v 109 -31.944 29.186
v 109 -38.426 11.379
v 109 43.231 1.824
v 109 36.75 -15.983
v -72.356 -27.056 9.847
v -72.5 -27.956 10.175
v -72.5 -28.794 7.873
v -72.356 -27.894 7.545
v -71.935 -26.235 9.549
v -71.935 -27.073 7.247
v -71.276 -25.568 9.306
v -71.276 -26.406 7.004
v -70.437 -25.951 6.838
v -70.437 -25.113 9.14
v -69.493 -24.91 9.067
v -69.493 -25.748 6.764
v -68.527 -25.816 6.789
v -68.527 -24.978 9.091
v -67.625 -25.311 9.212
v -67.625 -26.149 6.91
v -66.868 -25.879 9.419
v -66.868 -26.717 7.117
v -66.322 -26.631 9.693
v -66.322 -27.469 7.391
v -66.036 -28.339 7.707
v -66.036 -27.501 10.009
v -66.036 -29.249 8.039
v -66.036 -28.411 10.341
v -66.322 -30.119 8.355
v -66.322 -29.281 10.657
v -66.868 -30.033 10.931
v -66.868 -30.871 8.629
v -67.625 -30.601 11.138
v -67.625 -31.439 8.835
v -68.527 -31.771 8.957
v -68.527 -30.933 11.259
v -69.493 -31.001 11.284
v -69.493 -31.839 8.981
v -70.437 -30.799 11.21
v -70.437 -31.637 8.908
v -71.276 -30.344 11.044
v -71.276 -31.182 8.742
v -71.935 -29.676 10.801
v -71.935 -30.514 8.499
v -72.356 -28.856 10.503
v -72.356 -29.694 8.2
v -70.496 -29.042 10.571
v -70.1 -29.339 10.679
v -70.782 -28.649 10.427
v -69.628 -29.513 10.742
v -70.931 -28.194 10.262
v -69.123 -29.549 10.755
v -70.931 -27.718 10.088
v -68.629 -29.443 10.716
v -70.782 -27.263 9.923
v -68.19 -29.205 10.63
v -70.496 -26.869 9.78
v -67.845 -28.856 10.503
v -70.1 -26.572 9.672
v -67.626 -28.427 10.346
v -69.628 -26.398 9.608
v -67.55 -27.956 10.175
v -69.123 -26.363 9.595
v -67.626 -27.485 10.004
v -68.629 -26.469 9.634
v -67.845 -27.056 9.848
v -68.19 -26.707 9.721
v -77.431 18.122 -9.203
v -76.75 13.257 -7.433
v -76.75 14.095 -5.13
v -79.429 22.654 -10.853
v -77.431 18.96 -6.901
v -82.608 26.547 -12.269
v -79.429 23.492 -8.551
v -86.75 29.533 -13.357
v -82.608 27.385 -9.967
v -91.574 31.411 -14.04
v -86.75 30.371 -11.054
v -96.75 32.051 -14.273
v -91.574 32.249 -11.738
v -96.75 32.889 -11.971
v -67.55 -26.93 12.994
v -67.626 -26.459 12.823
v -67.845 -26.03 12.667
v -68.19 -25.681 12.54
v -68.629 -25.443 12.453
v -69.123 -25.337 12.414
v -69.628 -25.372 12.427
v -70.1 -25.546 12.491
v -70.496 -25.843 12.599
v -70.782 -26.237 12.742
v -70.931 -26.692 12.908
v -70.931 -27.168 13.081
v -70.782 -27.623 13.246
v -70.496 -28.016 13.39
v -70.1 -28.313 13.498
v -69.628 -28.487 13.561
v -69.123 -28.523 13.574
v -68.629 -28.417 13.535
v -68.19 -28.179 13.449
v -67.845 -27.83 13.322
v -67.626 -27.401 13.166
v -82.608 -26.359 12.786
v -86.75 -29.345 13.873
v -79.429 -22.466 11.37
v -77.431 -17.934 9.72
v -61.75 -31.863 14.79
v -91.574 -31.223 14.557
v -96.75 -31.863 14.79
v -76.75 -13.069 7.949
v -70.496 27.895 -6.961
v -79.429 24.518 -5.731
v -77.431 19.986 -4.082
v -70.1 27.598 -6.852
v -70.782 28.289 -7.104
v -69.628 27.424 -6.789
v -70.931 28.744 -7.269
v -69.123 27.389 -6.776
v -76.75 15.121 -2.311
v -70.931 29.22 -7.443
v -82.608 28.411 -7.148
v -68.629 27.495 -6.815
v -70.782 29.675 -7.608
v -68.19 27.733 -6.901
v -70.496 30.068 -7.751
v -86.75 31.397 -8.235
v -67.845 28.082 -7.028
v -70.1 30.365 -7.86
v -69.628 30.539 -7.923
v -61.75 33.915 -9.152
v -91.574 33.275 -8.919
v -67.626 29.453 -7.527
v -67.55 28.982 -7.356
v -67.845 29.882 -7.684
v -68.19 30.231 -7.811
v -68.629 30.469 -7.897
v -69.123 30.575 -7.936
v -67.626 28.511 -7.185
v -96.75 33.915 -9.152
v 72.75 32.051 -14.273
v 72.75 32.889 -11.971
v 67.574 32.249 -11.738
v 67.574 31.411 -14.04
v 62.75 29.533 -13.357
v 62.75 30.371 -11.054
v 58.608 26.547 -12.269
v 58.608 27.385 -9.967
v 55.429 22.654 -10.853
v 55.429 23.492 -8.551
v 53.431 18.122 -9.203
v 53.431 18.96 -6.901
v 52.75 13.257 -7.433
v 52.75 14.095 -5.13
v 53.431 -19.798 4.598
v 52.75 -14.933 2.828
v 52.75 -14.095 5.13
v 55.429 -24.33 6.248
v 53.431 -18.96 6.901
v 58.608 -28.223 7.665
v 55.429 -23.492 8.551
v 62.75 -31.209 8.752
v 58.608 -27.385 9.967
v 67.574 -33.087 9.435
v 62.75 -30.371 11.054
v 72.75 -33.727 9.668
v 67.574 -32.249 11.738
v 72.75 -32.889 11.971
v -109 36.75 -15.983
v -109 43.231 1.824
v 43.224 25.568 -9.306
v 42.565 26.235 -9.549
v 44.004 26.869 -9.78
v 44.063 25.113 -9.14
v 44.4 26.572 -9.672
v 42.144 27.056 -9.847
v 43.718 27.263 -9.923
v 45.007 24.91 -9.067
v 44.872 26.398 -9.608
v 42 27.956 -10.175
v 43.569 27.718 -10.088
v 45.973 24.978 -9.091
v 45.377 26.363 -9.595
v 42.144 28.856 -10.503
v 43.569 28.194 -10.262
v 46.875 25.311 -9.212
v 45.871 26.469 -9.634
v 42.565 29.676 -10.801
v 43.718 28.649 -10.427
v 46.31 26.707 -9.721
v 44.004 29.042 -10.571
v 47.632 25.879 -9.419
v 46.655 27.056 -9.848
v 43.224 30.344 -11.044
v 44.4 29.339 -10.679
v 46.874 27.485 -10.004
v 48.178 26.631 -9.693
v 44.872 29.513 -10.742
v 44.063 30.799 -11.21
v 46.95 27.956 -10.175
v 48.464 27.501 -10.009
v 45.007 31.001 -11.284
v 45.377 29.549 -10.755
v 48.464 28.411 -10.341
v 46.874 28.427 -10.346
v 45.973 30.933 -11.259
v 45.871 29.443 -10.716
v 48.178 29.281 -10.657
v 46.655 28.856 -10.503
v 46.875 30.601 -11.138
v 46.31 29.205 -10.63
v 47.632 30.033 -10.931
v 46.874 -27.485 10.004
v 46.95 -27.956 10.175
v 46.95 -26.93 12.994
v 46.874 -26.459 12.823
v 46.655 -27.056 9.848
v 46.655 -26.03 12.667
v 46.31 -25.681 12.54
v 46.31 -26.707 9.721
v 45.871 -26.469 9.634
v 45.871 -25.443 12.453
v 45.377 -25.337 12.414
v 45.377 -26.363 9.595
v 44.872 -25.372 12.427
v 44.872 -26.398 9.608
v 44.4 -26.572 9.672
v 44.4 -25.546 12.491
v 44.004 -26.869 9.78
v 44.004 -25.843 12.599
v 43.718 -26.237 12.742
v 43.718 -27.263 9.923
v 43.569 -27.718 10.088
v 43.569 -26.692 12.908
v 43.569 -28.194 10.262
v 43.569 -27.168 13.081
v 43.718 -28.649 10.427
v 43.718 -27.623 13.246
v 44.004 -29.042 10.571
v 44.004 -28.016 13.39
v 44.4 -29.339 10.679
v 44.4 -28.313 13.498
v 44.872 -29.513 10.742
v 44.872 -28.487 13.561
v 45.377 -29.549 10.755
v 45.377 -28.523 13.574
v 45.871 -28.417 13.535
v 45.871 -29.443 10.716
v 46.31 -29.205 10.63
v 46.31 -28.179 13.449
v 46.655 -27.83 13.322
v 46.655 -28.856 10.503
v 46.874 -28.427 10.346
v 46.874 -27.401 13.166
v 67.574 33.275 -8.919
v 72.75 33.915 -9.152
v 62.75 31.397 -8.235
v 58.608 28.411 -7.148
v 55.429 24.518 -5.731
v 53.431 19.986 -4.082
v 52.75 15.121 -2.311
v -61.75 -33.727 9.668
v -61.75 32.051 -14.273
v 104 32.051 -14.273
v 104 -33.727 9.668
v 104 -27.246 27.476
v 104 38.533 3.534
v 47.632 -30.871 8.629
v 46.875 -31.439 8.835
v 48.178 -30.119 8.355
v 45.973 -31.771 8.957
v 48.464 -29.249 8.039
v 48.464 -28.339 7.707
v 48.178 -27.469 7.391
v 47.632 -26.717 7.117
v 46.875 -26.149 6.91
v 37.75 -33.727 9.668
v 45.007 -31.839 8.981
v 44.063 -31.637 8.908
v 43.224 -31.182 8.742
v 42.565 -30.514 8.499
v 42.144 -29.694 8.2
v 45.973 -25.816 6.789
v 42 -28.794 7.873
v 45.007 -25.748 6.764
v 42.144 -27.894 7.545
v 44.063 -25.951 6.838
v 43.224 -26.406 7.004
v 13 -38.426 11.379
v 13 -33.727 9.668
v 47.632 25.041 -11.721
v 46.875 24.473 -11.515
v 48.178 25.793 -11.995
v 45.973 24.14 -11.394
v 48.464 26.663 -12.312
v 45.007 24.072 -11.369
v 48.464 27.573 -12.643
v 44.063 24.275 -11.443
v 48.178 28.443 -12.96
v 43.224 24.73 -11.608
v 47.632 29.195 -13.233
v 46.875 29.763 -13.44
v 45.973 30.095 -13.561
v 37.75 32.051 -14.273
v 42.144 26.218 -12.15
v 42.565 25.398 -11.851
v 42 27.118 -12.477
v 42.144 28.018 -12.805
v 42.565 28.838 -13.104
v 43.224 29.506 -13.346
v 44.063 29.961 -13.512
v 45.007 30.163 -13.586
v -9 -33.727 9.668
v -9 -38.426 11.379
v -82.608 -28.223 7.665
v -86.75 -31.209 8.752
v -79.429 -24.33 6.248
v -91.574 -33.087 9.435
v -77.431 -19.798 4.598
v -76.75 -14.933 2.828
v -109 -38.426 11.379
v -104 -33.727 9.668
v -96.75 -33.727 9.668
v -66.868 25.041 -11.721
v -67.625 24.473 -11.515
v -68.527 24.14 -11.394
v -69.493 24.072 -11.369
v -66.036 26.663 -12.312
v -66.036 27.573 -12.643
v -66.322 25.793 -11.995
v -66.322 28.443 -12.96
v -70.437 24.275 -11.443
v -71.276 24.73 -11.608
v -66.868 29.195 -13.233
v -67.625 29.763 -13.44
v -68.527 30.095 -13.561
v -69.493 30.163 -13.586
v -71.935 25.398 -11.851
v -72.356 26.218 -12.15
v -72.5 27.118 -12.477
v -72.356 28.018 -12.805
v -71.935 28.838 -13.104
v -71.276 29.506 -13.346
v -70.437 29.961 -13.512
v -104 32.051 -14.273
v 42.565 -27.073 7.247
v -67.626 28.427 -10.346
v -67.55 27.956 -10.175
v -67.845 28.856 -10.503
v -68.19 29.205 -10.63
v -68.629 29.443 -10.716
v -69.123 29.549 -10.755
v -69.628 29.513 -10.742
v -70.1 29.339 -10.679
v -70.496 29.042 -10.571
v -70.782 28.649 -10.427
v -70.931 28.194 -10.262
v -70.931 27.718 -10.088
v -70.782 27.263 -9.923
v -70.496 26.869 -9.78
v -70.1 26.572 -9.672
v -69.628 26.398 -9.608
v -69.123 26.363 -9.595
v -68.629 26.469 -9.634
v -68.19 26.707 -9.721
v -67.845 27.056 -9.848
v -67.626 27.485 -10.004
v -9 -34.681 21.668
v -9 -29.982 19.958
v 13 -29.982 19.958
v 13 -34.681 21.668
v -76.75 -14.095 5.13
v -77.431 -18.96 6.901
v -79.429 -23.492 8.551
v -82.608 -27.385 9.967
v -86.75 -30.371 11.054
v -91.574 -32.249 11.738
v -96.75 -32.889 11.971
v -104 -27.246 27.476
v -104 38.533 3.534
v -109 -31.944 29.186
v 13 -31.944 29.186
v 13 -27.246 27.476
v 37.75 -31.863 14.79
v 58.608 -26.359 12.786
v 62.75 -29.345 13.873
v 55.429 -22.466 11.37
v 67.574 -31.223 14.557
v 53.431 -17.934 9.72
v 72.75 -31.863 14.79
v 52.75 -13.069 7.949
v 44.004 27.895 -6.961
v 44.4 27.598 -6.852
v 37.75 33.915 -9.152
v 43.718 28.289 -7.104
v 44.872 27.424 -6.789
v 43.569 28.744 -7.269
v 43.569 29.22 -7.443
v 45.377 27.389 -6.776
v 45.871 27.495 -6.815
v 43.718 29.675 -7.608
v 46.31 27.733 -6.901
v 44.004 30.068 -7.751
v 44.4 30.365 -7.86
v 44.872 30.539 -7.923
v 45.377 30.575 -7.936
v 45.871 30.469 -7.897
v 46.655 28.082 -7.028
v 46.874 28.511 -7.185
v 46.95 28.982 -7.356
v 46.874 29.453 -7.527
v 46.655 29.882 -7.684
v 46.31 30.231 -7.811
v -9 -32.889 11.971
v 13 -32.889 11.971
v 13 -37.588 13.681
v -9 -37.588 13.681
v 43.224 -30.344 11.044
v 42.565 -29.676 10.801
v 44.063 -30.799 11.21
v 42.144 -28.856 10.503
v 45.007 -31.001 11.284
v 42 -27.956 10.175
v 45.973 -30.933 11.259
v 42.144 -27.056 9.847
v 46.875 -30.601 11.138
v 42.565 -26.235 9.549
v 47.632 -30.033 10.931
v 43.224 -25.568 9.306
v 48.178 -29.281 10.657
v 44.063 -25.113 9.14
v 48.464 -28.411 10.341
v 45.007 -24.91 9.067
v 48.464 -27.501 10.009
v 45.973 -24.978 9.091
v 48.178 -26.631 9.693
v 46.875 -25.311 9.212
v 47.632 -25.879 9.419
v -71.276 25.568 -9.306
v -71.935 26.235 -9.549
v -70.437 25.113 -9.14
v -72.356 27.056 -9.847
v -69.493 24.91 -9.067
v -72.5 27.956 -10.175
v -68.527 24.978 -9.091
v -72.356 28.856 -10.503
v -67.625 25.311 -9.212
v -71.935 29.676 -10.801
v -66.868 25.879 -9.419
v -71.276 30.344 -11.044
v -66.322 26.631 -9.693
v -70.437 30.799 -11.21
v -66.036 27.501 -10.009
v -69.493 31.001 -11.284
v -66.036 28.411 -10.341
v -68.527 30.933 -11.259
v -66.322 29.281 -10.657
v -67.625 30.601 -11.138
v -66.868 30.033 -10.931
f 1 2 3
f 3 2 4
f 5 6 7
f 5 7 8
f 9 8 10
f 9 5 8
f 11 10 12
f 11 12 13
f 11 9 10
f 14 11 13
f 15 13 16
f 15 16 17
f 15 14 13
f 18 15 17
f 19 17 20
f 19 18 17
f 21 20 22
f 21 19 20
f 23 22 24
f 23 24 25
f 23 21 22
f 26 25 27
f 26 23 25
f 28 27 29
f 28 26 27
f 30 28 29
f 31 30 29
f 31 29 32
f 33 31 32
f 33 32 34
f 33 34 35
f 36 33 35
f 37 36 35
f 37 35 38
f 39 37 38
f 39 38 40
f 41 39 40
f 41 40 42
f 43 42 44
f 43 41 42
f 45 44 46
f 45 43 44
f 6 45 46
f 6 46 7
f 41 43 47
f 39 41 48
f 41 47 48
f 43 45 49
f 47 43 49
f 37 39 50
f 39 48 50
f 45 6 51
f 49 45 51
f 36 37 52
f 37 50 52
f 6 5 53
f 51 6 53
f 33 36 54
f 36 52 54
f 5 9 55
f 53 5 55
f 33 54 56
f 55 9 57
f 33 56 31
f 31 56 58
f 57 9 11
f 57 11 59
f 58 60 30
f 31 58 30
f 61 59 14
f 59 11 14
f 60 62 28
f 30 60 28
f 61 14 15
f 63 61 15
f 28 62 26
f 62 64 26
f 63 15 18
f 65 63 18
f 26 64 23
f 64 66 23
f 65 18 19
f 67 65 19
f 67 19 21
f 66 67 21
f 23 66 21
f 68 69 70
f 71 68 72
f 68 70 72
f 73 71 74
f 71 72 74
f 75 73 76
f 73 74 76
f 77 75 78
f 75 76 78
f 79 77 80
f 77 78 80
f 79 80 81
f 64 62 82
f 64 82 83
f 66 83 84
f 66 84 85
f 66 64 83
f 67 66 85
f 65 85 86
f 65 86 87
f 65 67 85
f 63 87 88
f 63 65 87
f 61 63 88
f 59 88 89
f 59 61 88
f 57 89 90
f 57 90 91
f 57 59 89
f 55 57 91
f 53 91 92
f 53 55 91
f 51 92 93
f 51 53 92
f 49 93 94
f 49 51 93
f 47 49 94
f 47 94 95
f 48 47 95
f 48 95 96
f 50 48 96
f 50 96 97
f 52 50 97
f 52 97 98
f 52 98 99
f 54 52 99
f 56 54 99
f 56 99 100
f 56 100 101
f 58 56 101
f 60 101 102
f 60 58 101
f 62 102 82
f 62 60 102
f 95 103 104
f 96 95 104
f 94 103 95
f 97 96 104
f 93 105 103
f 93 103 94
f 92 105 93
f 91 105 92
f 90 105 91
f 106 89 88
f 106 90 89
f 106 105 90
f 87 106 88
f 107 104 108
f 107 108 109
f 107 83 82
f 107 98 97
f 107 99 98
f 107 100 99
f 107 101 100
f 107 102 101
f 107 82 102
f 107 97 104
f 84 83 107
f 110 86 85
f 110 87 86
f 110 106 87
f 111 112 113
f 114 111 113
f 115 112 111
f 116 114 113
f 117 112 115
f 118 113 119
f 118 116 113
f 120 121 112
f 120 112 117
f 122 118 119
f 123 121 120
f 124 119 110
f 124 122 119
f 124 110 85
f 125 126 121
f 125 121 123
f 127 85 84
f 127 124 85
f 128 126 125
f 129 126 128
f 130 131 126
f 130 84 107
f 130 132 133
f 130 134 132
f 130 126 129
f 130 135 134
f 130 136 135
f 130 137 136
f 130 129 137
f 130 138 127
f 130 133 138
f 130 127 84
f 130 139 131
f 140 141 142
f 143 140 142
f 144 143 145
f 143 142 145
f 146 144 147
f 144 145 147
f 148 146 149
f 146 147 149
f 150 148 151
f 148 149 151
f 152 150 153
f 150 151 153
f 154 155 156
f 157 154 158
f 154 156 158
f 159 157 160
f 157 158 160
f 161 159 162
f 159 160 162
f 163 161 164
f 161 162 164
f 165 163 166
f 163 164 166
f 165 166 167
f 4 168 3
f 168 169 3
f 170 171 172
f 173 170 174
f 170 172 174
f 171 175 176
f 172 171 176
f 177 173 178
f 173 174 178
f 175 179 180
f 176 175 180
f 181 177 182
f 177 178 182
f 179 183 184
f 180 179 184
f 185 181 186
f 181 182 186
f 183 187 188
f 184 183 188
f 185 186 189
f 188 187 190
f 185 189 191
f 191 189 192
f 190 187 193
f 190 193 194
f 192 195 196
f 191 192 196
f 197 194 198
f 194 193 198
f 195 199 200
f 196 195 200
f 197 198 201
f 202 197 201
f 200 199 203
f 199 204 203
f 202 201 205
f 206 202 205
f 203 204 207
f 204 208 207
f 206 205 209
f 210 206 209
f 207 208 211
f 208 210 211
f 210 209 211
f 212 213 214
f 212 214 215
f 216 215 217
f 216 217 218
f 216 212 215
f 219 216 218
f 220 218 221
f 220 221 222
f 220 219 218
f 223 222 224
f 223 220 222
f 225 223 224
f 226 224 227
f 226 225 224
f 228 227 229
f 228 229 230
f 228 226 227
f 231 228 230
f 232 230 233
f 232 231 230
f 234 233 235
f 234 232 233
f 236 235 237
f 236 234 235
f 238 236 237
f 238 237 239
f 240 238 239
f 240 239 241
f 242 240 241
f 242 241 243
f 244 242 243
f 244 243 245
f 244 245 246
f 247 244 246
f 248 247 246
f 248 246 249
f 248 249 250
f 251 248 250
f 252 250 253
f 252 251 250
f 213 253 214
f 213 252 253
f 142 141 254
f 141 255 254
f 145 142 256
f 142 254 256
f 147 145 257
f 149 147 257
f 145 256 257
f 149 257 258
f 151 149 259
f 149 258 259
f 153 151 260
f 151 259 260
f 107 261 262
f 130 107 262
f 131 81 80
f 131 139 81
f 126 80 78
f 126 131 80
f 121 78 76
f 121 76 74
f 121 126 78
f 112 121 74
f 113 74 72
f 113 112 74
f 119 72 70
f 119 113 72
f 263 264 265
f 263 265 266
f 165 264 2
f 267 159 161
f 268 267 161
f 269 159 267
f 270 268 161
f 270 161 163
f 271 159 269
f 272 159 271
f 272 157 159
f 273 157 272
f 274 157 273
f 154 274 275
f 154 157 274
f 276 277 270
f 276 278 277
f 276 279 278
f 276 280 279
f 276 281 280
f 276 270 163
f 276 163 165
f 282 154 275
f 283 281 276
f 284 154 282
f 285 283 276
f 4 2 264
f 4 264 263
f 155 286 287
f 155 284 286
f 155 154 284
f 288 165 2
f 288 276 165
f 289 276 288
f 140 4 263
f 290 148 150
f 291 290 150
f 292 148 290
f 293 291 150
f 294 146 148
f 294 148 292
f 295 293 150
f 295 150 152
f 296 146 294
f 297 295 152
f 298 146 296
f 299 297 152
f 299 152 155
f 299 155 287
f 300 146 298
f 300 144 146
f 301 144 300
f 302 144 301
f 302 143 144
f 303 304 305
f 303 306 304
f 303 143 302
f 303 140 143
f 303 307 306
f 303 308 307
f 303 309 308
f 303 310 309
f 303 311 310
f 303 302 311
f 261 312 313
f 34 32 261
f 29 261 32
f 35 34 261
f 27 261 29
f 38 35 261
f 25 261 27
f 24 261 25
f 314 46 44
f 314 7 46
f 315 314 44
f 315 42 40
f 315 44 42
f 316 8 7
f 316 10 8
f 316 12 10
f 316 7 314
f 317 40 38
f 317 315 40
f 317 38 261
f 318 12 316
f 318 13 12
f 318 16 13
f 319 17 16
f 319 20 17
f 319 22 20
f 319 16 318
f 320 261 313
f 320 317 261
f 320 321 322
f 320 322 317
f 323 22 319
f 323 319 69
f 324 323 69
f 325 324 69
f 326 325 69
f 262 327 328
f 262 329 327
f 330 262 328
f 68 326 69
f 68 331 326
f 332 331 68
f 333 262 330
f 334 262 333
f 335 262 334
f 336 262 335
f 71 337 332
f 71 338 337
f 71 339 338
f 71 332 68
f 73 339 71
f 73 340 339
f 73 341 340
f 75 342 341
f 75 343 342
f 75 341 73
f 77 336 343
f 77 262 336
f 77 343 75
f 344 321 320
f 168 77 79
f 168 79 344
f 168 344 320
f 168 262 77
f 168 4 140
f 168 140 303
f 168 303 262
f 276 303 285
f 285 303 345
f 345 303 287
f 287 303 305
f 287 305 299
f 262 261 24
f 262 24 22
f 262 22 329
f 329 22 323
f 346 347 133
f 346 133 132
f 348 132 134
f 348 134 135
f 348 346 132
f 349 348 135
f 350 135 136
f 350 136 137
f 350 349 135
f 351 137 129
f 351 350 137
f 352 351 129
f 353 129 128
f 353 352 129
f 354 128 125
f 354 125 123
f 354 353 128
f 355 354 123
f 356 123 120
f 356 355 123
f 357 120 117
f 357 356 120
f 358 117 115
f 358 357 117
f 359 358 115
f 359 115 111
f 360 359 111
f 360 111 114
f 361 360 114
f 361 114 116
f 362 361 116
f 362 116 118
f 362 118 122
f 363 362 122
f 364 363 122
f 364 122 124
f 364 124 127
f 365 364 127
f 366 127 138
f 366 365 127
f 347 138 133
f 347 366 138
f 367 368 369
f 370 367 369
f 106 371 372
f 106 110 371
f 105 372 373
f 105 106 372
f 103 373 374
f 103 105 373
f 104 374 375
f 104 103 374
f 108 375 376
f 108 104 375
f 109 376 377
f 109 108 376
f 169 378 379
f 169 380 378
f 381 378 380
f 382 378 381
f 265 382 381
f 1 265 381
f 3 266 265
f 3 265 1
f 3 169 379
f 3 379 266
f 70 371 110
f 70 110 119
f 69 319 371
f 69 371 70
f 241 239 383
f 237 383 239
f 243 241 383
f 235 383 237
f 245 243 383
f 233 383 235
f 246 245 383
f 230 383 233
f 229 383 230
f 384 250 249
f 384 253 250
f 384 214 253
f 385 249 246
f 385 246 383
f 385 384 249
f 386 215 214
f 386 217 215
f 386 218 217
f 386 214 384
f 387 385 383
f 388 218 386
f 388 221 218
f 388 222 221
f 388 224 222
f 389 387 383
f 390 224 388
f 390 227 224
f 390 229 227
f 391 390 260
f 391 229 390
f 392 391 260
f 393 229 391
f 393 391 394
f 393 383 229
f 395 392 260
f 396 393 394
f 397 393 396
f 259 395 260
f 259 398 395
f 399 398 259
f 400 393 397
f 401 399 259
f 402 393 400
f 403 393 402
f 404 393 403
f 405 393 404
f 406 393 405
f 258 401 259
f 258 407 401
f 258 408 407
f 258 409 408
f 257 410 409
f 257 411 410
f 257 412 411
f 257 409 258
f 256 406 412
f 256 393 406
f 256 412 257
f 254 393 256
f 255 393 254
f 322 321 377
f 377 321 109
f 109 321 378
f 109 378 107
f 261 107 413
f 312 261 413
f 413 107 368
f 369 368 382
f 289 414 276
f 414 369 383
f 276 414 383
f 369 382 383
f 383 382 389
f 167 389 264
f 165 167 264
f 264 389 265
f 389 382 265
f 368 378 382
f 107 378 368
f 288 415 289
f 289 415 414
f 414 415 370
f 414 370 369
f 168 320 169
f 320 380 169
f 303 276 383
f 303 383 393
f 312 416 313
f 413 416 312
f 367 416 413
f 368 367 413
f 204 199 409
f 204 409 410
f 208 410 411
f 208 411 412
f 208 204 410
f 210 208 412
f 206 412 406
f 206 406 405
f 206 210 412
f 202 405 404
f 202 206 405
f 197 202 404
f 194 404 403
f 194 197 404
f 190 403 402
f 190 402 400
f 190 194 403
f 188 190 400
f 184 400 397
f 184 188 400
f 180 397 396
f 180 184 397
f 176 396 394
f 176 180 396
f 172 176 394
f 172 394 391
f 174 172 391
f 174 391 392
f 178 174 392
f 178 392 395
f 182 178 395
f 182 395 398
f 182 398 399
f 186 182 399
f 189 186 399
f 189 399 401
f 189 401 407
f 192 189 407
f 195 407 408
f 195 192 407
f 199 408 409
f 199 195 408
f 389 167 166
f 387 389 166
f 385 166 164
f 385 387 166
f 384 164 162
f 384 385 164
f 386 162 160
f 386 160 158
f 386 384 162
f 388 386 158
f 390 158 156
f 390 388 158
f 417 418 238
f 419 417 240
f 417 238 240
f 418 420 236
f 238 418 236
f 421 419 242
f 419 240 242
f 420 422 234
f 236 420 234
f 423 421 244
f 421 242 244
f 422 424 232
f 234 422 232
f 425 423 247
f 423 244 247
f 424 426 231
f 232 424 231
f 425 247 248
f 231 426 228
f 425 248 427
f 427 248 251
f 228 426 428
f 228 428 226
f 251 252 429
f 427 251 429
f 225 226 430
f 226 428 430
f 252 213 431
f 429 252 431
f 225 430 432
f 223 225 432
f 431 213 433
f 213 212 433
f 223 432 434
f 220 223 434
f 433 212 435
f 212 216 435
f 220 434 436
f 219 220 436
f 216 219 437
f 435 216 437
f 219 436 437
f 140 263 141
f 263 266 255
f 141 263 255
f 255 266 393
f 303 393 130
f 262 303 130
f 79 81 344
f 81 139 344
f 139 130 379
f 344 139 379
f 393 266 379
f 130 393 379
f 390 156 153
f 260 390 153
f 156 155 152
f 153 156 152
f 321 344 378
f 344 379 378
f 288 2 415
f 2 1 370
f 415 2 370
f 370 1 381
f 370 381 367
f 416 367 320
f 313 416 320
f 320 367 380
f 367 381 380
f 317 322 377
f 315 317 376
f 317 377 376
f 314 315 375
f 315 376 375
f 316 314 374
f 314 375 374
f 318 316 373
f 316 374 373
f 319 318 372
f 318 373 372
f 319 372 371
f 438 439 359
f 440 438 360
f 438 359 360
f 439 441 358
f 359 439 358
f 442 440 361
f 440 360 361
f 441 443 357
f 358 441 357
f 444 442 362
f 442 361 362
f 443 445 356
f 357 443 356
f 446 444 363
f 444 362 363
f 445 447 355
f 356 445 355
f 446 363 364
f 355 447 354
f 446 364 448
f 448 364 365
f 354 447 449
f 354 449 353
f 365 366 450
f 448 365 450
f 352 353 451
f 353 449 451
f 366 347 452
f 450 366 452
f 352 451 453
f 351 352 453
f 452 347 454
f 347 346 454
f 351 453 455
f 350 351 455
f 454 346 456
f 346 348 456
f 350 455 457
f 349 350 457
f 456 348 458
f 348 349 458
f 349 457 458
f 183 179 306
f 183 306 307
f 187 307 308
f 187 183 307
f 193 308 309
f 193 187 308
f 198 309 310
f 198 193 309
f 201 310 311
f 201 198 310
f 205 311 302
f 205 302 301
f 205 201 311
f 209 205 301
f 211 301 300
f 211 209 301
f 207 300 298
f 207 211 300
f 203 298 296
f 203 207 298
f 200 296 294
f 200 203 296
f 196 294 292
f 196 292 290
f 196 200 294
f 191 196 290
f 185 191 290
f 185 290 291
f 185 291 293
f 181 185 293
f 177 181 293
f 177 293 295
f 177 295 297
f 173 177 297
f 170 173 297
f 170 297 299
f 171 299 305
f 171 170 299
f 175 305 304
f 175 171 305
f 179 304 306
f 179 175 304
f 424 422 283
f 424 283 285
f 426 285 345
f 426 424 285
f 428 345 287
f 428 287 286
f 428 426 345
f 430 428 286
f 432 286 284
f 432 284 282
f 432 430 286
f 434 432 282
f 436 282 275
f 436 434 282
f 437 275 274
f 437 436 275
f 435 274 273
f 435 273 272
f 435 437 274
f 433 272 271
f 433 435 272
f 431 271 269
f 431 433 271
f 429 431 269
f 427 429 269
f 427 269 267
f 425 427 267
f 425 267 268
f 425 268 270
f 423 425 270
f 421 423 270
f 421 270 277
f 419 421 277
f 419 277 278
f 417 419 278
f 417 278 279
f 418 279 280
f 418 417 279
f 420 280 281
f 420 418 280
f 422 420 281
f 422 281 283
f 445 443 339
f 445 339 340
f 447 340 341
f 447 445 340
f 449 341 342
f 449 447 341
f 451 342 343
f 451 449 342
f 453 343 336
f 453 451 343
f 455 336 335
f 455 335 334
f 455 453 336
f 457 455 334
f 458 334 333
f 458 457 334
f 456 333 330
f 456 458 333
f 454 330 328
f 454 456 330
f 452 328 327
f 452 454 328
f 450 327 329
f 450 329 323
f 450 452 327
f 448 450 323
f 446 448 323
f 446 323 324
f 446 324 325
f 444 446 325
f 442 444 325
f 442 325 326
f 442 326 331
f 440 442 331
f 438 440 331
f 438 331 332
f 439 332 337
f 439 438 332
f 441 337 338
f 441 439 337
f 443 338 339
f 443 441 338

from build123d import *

# Parameters (mm, degrees)
ESQUISSE1_W             = 218
ESQUISSE1_H             = 80
ESQUISSE1_W_2           = 208
ESQUISSE1_H_2           = 70
BOSS_EXTRU_1_DEPTH      = 16.5
ESQUISSE2_W             = 15
ESQUISSE2_H             = 80
ESQUISSE2_R             = 3.25
BOSS_EXTRU_2_DEPTH      = 2.45
ESQUISSE3_W             = 22
ESQUISSE3_H             = 5
ENL_V_MAT_EXTRU_1_DEPTH = 16.5
ESQUISSE4_W             = 15
ESQUISSE4_H             = 70
ESQUISSE4_R             = 1.7
BOSS_EXTRU_3_DEPTH      = 3
CONG_1_R                = 20
ESQUISSE7_W             = 22
ESQUISSE7_H             = 5
BOSS_EXTRU_5_DEPTH      = 8
ESQUISSE8_W             = 52.75
ESQUISSE8_H             = 5
ESQUISSE8_W_2           = 24.75
ESQUISSE8_W_3           = 99.5
BOSS_EXTRU_6_DEPTH      = 2.45


with BuildPart() as part:
    # Esquisse1 → Boss.-Extru.1 (new body)
    with BuildSketch(Plane(origin=(0, 0, 0), x_dir=(1, 0, 0), z_dir=(0, 0.342020143, 0.939692621))):
        Rectangle(ESQUISSE1_W, ESQUISSE1_H)
        Rectangle(ESQUISSE1_W_2, ESQUISSE1_H_2, mode=Mode.SUBTRACT)
    extrude(amount=BOSS_EXTRU_1_DEPTH)

    # Esquisse2 → Boss.-Extru.2 (add)
    with BuildSketch(Plane(origin=(0, 0, 0), x_dir=(-1, 0, 0), z_dir=(0, -0.342020143, -0.939692621))):
        with Locations((-45.25, 0)):
            Rectangle(ESQUISSE2_W, ESQUISSE2_H)
        with Locations((-45.25, 29.75)):
            Circle(ESQUISSE2_R, mode=Mode.SUBTRACT)
        with Locations((-45.25, -29.75)):
            Circle(ESQUISSE2_R, mode=Mode.SUBTRACT)
        with Locations((69.25, 0)):
            Rectangle(ESQUISSE2_W, ESQUISSE2_H)
        with Locations((69.25, 29.75)):
            Circle(ESQUISSE2_R, mode=Mode.SUBTRACT)
        with Locations((69.25, -29.75)):
            Circle(ESQUISSE2_R, mode=Mode.SUBTRACT)
    extrude(amount=BOSS_EXTRU_2_DEPTH)

    # Esquisse3 → Enlèv. mat.-Extru.1 (cut)
    with BuildSketch(Plane(origin=(0, 5.643332365, 15.504928243), x_dir=(1, 0, 0), z_dir=(0, 0.342020143, 0.939692621))):
        with Locations((2, -37.5)):
            Rectangle(ESQUISSE3_W, ESQUISSE3_H)
    extrude(amount=-ENL_V_MAT_EXTRU_1_DEPTH, mode=Mode.SUBTRACT)

    # Esquisse4 → Boss.-Extru.3 (add)
    with BuildSketch(Plane(origin=(0, 0, 0), x_dir=(1, 0, 0), z_dir=(0, 0.342020143, 0.939692621))):
        with Locations((45.25, 0)):
            Rectangle(ESQUISSE4_W, ESQUISSE4_H)
        with Locations((45.25, -29.75)):
            Circle(ESQUISSE4_R, mode=Mode.SUBTRACT)
        with Locations((45.25, 29.75)):
            Circle(ESQUISSE4_R, mode=Mode.SUBTRACT)
        with Locations((-69.25, 0)):
            Rectangle(ESQUISSE4_W, ESQUISSE4_H)
        with Locations((-69.25, 29.75)):
            Circle(ESQUISSE4_R, mode=Mode.SUBTRACT)
        with Locations((-69.25, -29.75)):
            Circle(ESQUISSE4_R, mode=Mode.SUBTRACT)
    extrude(amount=BOSS_EXTRU_3_DEPTH)

    # Congé1
    cong_1_edges = [part.edges().sort_by_distance(p)[0] for p in [
        (52.75, -32.376211513, 13.380243948),
        (52.75, 33.402271942, -10.561166085),
        (-76.75, 33.402271942, -10.561166085),
        (-76.75, -32.376211513, 13.380243948),
    ]]
    fillet(cong_1_edges, radius=CONG_1_R)

    # Esquisse7 → Boss.-Extru.5 (add)
    with BuildSketch(Plane(origin=(0, 5.643332365, 15.504928243), x_dir=(1, 0, 0), z_dir=(0, 0.342020143, 0.939692621))):
        with Locations((2, -37.5)):
            Rectangle(ESQUISSE7_W, ESQUISSE7_H)
    extrude(amount=-BOSS_EXTRU_5_DEPTH)

    # Esquisse8 → Boss.-Extru.6 (add)
    with BuildSketch(Plane(origin=(0, 0, 0), x_dir=(-1, 0, 0), z_dir=(0, -0.342020143, -0.939692621))):
        with BuildLine():
            Line((76.75, -15), (76.75, -40))
            Line((76.75, -40), (109, -40))
            Line((109, -40), (109, 40))
            Line((109, 40), (76.75, 40))
            Line((76.75, 40), (76.75, 15))
            ThreePointArc((76.75, 15), (82.607864376, 29.142135624), (96.75, 35))
            Line((96.75, 35), (104, 35))
            Line((104, 35), (104, -35))
            Line((104, -35), (96.75, -35))
            ThreePointArc((96.75, -35), (82.607864376, -29.142135624), (76.75, -15))
        make_face()
        with BuildLine():
            Line((-52.75, 15), (-52.75, 40))
            Line((-52.75, 40), (-109, 40))
            Line((-109, 40), (-109, -40))
            Line((-109, -40), (-52.75, -40))
            Line((-52.75, -40), (-52.75, -15))
            ThreePointArc((-52.75, -15), (-58.607864376, -29.142135624), (-72.75, -35))
            Line((-72.75, -35), (-104, -35))
            Line((-104, -35), (-104, 35))
            Line((-104, 35), (-72.75, 35))
            ThreePointArc((-72.75, 35), (-58.607864376, 29.142135624), (-52.75, 15))
        make_face()
        with Locations((35.375, -37.5)):
            Rectangle(ESQUISSE8_W, ESQUISSE8_H)
        with Locations((-25.375, -37.5)):
            Rectangle(ESQUISSE8_W_2, ESQUISSE8_H)
        with Locations((12, 37.5)):
            Rectangle(ESQUISSE8_W_3, ESQUISSE8_H)
    extrude(amount=BOSS_EXTRU_6_DEPTH)


solid = part.part
